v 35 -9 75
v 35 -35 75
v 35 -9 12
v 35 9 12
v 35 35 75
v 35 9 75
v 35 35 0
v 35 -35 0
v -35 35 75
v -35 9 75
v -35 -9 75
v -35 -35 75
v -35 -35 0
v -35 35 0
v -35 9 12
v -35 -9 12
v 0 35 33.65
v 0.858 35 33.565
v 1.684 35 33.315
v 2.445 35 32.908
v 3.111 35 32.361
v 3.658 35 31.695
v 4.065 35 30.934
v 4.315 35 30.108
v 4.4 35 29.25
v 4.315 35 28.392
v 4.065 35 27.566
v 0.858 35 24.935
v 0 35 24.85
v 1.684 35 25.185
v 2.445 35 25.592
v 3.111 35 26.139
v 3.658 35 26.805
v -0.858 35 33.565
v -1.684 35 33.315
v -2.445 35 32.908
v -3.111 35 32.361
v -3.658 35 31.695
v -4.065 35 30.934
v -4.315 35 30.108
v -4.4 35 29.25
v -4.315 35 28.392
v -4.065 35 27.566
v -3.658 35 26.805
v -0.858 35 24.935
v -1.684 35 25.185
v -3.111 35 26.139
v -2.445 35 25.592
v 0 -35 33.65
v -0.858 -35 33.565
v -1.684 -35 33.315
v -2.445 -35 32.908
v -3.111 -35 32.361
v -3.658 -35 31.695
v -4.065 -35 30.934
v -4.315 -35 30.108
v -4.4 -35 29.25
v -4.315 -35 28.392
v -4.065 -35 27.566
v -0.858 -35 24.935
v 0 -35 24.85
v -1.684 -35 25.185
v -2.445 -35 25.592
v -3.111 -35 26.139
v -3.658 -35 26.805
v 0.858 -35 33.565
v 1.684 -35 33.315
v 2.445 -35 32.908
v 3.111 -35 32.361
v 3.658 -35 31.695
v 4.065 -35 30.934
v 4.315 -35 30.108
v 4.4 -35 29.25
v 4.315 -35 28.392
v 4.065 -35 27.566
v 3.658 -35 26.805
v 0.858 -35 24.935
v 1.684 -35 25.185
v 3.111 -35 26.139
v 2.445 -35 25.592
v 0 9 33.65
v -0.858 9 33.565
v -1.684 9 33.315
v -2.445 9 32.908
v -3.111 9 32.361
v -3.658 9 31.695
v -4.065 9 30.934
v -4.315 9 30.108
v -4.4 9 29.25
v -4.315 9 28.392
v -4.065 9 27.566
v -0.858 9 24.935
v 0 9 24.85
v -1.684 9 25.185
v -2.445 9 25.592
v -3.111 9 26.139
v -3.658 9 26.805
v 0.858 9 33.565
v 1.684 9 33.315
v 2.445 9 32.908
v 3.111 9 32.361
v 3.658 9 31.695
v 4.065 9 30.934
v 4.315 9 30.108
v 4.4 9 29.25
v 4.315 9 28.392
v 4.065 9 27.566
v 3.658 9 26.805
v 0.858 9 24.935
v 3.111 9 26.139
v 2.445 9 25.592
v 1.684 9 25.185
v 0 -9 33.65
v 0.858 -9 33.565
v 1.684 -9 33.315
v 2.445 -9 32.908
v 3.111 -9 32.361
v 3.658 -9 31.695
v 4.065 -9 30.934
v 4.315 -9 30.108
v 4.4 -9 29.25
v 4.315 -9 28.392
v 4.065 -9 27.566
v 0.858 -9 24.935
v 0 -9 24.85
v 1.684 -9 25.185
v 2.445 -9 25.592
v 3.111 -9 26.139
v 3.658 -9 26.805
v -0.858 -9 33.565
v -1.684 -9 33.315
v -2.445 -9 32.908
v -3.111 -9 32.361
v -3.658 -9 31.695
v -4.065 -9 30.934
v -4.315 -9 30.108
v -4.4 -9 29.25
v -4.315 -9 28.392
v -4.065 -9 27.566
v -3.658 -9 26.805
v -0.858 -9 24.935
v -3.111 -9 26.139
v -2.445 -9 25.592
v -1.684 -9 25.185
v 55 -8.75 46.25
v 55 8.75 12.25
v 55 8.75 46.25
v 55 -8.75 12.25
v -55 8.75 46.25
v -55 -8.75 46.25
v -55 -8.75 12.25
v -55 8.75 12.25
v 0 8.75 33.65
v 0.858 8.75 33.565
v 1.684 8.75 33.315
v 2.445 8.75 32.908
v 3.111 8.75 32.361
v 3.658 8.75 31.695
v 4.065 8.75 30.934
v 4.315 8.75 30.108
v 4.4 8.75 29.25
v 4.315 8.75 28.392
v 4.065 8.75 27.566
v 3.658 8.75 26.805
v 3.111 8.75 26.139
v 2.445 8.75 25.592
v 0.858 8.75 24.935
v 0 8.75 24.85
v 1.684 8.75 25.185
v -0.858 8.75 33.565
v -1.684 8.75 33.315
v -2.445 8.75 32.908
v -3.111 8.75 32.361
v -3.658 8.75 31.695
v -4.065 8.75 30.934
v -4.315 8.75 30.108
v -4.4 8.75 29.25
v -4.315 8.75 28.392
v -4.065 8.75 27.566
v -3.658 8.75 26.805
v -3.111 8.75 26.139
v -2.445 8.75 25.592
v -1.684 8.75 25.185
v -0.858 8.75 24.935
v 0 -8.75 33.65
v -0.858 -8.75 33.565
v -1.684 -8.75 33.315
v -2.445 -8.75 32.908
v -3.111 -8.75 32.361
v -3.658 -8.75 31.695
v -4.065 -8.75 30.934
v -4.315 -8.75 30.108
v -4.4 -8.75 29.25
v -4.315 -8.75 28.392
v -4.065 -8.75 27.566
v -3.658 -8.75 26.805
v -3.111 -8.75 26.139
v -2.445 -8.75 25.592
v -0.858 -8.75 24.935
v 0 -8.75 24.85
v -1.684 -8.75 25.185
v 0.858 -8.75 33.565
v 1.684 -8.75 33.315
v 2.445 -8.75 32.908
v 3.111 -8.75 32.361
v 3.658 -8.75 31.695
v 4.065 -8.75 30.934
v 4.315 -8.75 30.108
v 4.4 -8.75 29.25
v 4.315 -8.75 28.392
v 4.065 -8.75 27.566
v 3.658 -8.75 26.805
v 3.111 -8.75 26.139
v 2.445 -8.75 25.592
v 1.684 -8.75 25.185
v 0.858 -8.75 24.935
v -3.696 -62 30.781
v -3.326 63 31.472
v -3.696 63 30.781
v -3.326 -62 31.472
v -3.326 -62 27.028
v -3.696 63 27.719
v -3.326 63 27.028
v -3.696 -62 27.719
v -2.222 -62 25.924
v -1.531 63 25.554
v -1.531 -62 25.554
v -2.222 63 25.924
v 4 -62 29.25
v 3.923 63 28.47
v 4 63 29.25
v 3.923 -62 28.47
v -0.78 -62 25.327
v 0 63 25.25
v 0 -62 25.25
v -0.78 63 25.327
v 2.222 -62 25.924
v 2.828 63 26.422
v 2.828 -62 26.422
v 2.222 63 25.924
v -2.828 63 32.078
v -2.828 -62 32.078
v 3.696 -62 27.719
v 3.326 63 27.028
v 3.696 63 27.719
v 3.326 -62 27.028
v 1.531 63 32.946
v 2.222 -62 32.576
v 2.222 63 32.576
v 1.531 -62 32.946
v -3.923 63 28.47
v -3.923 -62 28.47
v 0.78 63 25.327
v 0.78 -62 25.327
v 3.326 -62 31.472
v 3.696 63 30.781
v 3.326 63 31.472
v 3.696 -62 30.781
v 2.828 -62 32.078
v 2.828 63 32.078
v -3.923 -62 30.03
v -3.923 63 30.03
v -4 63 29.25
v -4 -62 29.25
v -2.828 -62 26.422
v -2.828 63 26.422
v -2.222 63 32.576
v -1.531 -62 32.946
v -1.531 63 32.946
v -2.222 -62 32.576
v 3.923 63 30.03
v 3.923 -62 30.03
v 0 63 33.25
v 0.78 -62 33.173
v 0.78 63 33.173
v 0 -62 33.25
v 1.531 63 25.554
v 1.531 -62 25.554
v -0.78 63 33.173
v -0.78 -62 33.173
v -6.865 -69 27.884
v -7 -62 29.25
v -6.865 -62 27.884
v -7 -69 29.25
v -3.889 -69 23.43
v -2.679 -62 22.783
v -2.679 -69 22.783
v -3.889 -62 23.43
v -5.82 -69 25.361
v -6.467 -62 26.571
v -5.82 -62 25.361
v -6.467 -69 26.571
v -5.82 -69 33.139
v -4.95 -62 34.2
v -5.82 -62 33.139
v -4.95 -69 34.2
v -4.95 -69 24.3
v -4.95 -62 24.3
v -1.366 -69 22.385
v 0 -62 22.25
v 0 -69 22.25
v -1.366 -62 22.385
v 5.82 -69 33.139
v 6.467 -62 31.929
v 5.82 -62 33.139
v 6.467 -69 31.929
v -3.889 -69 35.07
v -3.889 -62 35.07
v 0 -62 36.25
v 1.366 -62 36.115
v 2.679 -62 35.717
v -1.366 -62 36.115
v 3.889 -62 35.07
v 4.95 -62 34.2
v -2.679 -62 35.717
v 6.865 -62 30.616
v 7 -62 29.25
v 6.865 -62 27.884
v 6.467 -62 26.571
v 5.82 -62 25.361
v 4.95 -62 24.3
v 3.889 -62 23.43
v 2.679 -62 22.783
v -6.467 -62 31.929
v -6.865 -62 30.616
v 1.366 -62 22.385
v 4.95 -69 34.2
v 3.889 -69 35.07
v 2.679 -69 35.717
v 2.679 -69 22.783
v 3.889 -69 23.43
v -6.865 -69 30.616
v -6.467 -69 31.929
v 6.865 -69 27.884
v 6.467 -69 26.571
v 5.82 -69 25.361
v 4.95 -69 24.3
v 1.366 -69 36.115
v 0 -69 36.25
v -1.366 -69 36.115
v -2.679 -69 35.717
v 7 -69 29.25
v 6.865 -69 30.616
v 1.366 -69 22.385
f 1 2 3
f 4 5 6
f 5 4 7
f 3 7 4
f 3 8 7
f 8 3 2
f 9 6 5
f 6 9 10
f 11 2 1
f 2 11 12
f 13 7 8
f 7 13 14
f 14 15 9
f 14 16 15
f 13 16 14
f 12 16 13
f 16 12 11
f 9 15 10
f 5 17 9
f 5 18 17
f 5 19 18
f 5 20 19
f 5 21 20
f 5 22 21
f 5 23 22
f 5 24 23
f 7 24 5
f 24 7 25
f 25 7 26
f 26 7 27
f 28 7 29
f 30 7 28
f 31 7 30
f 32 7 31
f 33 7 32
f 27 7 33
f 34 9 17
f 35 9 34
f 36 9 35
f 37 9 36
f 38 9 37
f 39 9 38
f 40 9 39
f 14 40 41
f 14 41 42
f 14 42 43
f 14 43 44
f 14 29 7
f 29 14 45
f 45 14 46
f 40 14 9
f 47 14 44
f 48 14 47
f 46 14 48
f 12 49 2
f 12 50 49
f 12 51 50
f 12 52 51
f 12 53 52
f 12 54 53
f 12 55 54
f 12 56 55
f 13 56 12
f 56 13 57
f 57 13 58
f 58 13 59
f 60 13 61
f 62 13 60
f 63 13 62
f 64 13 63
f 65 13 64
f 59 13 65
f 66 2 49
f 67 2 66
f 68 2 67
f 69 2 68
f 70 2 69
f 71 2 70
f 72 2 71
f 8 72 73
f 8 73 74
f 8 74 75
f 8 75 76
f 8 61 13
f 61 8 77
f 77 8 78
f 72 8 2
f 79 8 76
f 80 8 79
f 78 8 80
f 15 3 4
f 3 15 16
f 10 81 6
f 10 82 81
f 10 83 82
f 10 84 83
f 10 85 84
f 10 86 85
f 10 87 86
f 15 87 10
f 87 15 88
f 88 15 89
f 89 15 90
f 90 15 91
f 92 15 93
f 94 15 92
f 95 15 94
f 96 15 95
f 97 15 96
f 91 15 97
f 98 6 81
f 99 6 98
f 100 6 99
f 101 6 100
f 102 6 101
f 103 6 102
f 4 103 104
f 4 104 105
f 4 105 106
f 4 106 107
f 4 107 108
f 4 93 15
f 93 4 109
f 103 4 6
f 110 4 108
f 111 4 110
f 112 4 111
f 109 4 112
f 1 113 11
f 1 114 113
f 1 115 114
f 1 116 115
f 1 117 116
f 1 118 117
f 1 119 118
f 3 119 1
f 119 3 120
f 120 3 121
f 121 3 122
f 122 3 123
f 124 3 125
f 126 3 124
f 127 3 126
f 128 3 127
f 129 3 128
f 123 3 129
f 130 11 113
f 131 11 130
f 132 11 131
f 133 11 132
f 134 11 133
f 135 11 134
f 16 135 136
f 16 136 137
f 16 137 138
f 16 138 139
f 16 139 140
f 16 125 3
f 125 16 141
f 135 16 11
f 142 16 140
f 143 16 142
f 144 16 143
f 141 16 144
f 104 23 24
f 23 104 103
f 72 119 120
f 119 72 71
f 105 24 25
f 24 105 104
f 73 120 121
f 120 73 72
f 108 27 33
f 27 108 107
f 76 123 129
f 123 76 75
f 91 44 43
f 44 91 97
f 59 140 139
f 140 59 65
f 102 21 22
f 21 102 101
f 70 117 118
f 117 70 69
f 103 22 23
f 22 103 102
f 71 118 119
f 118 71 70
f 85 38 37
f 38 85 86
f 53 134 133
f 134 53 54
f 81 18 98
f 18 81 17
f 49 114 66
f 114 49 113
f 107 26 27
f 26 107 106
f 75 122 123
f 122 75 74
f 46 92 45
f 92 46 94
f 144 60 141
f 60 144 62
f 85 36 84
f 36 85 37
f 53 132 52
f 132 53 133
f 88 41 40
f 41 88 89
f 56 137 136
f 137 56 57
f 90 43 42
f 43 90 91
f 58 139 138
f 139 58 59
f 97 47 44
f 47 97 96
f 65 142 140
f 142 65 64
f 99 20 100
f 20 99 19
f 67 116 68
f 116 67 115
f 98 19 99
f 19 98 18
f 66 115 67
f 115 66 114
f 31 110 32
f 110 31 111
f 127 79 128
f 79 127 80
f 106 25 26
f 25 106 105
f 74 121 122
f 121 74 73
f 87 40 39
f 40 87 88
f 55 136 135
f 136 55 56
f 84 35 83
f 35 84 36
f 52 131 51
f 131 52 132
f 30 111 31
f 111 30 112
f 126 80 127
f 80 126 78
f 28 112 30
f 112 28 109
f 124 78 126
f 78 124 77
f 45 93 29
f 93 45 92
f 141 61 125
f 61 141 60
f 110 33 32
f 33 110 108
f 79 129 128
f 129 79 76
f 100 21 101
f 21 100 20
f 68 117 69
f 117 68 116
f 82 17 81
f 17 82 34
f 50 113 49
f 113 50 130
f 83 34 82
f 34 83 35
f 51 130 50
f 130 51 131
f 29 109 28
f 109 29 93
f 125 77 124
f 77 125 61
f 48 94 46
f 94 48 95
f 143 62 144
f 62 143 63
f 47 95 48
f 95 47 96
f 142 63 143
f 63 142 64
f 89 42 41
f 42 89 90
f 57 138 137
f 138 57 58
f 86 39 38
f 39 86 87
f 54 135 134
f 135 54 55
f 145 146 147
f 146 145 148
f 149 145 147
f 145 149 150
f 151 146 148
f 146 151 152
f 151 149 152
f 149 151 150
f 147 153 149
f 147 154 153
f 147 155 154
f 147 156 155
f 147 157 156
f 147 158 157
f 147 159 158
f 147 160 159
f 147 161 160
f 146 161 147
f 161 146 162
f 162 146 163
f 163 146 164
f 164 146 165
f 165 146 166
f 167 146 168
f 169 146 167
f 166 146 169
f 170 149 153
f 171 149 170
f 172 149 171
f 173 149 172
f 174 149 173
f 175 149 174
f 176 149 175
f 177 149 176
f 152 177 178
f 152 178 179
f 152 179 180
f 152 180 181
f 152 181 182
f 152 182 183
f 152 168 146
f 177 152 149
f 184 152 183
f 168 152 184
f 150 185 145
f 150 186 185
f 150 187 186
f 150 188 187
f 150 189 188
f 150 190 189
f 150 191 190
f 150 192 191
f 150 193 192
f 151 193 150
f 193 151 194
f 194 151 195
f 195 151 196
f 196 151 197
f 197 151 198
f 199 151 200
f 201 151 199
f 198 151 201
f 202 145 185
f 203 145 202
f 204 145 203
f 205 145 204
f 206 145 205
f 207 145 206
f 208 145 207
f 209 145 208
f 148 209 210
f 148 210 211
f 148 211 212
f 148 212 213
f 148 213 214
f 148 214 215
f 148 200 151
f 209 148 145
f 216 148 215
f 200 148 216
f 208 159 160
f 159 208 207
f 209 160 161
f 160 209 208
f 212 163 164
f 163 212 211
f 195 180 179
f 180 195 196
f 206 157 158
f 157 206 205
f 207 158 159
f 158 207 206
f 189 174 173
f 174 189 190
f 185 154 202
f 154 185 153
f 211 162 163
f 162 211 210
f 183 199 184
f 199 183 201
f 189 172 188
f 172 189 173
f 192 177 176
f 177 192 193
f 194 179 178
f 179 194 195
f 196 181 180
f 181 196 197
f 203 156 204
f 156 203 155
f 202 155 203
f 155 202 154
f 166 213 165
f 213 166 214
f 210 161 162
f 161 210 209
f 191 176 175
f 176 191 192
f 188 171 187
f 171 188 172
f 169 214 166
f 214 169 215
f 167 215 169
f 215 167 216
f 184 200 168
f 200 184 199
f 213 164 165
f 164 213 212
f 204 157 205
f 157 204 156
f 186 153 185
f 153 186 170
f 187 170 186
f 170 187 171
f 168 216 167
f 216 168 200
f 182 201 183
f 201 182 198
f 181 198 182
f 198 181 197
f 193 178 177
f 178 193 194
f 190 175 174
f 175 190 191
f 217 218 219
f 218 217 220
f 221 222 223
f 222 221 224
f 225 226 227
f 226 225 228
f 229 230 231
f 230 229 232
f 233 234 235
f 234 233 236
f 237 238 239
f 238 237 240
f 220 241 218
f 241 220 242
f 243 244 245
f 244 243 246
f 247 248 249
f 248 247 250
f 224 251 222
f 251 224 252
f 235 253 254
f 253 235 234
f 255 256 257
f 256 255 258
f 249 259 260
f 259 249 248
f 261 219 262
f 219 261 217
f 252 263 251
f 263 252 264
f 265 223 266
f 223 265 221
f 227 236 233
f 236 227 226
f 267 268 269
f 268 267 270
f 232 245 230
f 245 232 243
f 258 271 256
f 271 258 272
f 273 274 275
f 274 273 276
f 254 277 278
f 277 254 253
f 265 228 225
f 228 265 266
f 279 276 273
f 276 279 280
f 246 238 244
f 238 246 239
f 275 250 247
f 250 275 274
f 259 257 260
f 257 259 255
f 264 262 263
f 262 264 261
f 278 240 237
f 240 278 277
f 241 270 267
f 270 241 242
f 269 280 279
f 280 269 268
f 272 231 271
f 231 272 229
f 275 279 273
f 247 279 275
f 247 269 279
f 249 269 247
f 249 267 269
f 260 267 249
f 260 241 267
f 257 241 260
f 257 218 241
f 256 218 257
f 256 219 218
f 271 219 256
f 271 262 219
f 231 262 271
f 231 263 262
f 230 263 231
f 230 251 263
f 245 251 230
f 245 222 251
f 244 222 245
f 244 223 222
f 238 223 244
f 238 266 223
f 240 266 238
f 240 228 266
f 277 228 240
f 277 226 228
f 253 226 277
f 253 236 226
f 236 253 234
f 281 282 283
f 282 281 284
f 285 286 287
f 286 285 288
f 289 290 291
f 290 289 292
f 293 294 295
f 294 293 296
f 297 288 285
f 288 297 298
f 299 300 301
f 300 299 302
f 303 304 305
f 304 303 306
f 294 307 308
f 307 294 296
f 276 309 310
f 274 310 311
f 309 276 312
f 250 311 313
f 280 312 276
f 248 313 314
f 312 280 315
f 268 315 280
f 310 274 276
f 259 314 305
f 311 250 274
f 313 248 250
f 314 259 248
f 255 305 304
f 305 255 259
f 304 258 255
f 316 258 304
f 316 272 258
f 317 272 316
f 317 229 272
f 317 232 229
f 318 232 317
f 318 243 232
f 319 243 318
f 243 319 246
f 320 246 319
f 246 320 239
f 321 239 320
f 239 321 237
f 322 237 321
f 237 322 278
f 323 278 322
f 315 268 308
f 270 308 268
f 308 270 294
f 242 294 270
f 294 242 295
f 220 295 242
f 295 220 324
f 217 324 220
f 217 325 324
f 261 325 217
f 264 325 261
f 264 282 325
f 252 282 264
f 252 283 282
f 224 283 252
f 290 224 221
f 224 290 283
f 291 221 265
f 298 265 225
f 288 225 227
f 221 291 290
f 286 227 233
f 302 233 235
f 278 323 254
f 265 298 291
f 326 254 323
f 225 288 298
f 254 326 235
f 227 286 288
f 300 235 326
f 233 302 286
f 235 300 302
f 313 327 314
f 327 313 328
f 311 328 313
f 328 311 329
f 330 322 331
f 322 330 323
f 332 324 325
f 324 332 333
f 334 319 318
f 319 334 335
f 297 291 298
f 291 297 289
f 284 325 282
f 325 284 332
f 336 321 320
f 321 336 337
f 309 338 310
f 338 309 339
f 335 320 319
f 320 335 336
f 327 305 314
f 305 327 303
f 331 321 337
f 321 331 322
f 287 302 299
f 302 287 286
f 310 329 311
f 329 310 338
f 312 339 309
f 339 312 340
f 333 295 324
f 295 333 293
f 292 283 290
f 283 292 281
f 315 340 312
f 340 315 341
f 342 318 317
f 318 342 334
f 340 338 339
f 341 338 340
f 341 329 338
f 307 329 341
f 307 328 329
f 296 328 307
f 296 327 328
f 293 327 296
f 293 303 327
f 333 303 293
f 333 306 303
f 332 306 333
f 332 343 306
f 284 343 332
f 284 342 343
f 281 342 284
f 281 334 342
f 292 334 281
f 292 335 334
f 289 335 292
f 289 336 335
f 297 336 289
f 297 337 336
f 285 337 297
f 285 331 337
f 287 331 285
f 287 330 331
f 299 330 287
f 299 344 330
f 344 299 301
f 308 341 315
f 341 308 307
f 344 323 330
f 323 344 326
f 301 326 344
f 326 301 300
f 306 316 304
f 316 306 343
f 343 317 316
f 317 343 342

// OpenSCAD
$fn = 32;

// ------------------------------------------------------------------------
// Clevis joint: 70 mm clevis, pin d8
// Every part is its own module, assembly() places them once.
// ------------------------------------------------------------------------

// --- part 1 ---
module clevis() {
  difference() {
    translate([-35, -35, 0]) cube([70, 70, 75]);
    translate([-36, -9, 12]) cube([72, 18, 64]);
    translate([0, 0, 29.25]) rotate([90, 0, 0]) cylinder(h = 72, d = 8.8, center = true);
  }
}

// --- part 2 ---
module eye() {
  difference() {
    translate([-55, -8.75, 0]) cube([110, 17.5, 34]);
    translate([0, 0, 17]) rotate([90, 0, 0]) cylinder(h = 19.5, d = 8.8, center = true);
  }
}

// --- part 3 ---
module pin() {
  rotate([0, 90, 0]) cylinder(h = 126, d = 8, center = true);
  translate([-69, 0, 0]) rotate([0, 90, 0]) cylinder(h = 7, d = 14);
}

// --- assembly ---
module assembly() {
  translate([0, 0, 0]) rotate([0, 0, 0]) clevis();
  translate([0, 0, 12.25]) rotate([0, 0, 0]) eye();
  translate([0, 0, 29.25]) rotate([0, 0, 90]) pin();
}

assembly();
